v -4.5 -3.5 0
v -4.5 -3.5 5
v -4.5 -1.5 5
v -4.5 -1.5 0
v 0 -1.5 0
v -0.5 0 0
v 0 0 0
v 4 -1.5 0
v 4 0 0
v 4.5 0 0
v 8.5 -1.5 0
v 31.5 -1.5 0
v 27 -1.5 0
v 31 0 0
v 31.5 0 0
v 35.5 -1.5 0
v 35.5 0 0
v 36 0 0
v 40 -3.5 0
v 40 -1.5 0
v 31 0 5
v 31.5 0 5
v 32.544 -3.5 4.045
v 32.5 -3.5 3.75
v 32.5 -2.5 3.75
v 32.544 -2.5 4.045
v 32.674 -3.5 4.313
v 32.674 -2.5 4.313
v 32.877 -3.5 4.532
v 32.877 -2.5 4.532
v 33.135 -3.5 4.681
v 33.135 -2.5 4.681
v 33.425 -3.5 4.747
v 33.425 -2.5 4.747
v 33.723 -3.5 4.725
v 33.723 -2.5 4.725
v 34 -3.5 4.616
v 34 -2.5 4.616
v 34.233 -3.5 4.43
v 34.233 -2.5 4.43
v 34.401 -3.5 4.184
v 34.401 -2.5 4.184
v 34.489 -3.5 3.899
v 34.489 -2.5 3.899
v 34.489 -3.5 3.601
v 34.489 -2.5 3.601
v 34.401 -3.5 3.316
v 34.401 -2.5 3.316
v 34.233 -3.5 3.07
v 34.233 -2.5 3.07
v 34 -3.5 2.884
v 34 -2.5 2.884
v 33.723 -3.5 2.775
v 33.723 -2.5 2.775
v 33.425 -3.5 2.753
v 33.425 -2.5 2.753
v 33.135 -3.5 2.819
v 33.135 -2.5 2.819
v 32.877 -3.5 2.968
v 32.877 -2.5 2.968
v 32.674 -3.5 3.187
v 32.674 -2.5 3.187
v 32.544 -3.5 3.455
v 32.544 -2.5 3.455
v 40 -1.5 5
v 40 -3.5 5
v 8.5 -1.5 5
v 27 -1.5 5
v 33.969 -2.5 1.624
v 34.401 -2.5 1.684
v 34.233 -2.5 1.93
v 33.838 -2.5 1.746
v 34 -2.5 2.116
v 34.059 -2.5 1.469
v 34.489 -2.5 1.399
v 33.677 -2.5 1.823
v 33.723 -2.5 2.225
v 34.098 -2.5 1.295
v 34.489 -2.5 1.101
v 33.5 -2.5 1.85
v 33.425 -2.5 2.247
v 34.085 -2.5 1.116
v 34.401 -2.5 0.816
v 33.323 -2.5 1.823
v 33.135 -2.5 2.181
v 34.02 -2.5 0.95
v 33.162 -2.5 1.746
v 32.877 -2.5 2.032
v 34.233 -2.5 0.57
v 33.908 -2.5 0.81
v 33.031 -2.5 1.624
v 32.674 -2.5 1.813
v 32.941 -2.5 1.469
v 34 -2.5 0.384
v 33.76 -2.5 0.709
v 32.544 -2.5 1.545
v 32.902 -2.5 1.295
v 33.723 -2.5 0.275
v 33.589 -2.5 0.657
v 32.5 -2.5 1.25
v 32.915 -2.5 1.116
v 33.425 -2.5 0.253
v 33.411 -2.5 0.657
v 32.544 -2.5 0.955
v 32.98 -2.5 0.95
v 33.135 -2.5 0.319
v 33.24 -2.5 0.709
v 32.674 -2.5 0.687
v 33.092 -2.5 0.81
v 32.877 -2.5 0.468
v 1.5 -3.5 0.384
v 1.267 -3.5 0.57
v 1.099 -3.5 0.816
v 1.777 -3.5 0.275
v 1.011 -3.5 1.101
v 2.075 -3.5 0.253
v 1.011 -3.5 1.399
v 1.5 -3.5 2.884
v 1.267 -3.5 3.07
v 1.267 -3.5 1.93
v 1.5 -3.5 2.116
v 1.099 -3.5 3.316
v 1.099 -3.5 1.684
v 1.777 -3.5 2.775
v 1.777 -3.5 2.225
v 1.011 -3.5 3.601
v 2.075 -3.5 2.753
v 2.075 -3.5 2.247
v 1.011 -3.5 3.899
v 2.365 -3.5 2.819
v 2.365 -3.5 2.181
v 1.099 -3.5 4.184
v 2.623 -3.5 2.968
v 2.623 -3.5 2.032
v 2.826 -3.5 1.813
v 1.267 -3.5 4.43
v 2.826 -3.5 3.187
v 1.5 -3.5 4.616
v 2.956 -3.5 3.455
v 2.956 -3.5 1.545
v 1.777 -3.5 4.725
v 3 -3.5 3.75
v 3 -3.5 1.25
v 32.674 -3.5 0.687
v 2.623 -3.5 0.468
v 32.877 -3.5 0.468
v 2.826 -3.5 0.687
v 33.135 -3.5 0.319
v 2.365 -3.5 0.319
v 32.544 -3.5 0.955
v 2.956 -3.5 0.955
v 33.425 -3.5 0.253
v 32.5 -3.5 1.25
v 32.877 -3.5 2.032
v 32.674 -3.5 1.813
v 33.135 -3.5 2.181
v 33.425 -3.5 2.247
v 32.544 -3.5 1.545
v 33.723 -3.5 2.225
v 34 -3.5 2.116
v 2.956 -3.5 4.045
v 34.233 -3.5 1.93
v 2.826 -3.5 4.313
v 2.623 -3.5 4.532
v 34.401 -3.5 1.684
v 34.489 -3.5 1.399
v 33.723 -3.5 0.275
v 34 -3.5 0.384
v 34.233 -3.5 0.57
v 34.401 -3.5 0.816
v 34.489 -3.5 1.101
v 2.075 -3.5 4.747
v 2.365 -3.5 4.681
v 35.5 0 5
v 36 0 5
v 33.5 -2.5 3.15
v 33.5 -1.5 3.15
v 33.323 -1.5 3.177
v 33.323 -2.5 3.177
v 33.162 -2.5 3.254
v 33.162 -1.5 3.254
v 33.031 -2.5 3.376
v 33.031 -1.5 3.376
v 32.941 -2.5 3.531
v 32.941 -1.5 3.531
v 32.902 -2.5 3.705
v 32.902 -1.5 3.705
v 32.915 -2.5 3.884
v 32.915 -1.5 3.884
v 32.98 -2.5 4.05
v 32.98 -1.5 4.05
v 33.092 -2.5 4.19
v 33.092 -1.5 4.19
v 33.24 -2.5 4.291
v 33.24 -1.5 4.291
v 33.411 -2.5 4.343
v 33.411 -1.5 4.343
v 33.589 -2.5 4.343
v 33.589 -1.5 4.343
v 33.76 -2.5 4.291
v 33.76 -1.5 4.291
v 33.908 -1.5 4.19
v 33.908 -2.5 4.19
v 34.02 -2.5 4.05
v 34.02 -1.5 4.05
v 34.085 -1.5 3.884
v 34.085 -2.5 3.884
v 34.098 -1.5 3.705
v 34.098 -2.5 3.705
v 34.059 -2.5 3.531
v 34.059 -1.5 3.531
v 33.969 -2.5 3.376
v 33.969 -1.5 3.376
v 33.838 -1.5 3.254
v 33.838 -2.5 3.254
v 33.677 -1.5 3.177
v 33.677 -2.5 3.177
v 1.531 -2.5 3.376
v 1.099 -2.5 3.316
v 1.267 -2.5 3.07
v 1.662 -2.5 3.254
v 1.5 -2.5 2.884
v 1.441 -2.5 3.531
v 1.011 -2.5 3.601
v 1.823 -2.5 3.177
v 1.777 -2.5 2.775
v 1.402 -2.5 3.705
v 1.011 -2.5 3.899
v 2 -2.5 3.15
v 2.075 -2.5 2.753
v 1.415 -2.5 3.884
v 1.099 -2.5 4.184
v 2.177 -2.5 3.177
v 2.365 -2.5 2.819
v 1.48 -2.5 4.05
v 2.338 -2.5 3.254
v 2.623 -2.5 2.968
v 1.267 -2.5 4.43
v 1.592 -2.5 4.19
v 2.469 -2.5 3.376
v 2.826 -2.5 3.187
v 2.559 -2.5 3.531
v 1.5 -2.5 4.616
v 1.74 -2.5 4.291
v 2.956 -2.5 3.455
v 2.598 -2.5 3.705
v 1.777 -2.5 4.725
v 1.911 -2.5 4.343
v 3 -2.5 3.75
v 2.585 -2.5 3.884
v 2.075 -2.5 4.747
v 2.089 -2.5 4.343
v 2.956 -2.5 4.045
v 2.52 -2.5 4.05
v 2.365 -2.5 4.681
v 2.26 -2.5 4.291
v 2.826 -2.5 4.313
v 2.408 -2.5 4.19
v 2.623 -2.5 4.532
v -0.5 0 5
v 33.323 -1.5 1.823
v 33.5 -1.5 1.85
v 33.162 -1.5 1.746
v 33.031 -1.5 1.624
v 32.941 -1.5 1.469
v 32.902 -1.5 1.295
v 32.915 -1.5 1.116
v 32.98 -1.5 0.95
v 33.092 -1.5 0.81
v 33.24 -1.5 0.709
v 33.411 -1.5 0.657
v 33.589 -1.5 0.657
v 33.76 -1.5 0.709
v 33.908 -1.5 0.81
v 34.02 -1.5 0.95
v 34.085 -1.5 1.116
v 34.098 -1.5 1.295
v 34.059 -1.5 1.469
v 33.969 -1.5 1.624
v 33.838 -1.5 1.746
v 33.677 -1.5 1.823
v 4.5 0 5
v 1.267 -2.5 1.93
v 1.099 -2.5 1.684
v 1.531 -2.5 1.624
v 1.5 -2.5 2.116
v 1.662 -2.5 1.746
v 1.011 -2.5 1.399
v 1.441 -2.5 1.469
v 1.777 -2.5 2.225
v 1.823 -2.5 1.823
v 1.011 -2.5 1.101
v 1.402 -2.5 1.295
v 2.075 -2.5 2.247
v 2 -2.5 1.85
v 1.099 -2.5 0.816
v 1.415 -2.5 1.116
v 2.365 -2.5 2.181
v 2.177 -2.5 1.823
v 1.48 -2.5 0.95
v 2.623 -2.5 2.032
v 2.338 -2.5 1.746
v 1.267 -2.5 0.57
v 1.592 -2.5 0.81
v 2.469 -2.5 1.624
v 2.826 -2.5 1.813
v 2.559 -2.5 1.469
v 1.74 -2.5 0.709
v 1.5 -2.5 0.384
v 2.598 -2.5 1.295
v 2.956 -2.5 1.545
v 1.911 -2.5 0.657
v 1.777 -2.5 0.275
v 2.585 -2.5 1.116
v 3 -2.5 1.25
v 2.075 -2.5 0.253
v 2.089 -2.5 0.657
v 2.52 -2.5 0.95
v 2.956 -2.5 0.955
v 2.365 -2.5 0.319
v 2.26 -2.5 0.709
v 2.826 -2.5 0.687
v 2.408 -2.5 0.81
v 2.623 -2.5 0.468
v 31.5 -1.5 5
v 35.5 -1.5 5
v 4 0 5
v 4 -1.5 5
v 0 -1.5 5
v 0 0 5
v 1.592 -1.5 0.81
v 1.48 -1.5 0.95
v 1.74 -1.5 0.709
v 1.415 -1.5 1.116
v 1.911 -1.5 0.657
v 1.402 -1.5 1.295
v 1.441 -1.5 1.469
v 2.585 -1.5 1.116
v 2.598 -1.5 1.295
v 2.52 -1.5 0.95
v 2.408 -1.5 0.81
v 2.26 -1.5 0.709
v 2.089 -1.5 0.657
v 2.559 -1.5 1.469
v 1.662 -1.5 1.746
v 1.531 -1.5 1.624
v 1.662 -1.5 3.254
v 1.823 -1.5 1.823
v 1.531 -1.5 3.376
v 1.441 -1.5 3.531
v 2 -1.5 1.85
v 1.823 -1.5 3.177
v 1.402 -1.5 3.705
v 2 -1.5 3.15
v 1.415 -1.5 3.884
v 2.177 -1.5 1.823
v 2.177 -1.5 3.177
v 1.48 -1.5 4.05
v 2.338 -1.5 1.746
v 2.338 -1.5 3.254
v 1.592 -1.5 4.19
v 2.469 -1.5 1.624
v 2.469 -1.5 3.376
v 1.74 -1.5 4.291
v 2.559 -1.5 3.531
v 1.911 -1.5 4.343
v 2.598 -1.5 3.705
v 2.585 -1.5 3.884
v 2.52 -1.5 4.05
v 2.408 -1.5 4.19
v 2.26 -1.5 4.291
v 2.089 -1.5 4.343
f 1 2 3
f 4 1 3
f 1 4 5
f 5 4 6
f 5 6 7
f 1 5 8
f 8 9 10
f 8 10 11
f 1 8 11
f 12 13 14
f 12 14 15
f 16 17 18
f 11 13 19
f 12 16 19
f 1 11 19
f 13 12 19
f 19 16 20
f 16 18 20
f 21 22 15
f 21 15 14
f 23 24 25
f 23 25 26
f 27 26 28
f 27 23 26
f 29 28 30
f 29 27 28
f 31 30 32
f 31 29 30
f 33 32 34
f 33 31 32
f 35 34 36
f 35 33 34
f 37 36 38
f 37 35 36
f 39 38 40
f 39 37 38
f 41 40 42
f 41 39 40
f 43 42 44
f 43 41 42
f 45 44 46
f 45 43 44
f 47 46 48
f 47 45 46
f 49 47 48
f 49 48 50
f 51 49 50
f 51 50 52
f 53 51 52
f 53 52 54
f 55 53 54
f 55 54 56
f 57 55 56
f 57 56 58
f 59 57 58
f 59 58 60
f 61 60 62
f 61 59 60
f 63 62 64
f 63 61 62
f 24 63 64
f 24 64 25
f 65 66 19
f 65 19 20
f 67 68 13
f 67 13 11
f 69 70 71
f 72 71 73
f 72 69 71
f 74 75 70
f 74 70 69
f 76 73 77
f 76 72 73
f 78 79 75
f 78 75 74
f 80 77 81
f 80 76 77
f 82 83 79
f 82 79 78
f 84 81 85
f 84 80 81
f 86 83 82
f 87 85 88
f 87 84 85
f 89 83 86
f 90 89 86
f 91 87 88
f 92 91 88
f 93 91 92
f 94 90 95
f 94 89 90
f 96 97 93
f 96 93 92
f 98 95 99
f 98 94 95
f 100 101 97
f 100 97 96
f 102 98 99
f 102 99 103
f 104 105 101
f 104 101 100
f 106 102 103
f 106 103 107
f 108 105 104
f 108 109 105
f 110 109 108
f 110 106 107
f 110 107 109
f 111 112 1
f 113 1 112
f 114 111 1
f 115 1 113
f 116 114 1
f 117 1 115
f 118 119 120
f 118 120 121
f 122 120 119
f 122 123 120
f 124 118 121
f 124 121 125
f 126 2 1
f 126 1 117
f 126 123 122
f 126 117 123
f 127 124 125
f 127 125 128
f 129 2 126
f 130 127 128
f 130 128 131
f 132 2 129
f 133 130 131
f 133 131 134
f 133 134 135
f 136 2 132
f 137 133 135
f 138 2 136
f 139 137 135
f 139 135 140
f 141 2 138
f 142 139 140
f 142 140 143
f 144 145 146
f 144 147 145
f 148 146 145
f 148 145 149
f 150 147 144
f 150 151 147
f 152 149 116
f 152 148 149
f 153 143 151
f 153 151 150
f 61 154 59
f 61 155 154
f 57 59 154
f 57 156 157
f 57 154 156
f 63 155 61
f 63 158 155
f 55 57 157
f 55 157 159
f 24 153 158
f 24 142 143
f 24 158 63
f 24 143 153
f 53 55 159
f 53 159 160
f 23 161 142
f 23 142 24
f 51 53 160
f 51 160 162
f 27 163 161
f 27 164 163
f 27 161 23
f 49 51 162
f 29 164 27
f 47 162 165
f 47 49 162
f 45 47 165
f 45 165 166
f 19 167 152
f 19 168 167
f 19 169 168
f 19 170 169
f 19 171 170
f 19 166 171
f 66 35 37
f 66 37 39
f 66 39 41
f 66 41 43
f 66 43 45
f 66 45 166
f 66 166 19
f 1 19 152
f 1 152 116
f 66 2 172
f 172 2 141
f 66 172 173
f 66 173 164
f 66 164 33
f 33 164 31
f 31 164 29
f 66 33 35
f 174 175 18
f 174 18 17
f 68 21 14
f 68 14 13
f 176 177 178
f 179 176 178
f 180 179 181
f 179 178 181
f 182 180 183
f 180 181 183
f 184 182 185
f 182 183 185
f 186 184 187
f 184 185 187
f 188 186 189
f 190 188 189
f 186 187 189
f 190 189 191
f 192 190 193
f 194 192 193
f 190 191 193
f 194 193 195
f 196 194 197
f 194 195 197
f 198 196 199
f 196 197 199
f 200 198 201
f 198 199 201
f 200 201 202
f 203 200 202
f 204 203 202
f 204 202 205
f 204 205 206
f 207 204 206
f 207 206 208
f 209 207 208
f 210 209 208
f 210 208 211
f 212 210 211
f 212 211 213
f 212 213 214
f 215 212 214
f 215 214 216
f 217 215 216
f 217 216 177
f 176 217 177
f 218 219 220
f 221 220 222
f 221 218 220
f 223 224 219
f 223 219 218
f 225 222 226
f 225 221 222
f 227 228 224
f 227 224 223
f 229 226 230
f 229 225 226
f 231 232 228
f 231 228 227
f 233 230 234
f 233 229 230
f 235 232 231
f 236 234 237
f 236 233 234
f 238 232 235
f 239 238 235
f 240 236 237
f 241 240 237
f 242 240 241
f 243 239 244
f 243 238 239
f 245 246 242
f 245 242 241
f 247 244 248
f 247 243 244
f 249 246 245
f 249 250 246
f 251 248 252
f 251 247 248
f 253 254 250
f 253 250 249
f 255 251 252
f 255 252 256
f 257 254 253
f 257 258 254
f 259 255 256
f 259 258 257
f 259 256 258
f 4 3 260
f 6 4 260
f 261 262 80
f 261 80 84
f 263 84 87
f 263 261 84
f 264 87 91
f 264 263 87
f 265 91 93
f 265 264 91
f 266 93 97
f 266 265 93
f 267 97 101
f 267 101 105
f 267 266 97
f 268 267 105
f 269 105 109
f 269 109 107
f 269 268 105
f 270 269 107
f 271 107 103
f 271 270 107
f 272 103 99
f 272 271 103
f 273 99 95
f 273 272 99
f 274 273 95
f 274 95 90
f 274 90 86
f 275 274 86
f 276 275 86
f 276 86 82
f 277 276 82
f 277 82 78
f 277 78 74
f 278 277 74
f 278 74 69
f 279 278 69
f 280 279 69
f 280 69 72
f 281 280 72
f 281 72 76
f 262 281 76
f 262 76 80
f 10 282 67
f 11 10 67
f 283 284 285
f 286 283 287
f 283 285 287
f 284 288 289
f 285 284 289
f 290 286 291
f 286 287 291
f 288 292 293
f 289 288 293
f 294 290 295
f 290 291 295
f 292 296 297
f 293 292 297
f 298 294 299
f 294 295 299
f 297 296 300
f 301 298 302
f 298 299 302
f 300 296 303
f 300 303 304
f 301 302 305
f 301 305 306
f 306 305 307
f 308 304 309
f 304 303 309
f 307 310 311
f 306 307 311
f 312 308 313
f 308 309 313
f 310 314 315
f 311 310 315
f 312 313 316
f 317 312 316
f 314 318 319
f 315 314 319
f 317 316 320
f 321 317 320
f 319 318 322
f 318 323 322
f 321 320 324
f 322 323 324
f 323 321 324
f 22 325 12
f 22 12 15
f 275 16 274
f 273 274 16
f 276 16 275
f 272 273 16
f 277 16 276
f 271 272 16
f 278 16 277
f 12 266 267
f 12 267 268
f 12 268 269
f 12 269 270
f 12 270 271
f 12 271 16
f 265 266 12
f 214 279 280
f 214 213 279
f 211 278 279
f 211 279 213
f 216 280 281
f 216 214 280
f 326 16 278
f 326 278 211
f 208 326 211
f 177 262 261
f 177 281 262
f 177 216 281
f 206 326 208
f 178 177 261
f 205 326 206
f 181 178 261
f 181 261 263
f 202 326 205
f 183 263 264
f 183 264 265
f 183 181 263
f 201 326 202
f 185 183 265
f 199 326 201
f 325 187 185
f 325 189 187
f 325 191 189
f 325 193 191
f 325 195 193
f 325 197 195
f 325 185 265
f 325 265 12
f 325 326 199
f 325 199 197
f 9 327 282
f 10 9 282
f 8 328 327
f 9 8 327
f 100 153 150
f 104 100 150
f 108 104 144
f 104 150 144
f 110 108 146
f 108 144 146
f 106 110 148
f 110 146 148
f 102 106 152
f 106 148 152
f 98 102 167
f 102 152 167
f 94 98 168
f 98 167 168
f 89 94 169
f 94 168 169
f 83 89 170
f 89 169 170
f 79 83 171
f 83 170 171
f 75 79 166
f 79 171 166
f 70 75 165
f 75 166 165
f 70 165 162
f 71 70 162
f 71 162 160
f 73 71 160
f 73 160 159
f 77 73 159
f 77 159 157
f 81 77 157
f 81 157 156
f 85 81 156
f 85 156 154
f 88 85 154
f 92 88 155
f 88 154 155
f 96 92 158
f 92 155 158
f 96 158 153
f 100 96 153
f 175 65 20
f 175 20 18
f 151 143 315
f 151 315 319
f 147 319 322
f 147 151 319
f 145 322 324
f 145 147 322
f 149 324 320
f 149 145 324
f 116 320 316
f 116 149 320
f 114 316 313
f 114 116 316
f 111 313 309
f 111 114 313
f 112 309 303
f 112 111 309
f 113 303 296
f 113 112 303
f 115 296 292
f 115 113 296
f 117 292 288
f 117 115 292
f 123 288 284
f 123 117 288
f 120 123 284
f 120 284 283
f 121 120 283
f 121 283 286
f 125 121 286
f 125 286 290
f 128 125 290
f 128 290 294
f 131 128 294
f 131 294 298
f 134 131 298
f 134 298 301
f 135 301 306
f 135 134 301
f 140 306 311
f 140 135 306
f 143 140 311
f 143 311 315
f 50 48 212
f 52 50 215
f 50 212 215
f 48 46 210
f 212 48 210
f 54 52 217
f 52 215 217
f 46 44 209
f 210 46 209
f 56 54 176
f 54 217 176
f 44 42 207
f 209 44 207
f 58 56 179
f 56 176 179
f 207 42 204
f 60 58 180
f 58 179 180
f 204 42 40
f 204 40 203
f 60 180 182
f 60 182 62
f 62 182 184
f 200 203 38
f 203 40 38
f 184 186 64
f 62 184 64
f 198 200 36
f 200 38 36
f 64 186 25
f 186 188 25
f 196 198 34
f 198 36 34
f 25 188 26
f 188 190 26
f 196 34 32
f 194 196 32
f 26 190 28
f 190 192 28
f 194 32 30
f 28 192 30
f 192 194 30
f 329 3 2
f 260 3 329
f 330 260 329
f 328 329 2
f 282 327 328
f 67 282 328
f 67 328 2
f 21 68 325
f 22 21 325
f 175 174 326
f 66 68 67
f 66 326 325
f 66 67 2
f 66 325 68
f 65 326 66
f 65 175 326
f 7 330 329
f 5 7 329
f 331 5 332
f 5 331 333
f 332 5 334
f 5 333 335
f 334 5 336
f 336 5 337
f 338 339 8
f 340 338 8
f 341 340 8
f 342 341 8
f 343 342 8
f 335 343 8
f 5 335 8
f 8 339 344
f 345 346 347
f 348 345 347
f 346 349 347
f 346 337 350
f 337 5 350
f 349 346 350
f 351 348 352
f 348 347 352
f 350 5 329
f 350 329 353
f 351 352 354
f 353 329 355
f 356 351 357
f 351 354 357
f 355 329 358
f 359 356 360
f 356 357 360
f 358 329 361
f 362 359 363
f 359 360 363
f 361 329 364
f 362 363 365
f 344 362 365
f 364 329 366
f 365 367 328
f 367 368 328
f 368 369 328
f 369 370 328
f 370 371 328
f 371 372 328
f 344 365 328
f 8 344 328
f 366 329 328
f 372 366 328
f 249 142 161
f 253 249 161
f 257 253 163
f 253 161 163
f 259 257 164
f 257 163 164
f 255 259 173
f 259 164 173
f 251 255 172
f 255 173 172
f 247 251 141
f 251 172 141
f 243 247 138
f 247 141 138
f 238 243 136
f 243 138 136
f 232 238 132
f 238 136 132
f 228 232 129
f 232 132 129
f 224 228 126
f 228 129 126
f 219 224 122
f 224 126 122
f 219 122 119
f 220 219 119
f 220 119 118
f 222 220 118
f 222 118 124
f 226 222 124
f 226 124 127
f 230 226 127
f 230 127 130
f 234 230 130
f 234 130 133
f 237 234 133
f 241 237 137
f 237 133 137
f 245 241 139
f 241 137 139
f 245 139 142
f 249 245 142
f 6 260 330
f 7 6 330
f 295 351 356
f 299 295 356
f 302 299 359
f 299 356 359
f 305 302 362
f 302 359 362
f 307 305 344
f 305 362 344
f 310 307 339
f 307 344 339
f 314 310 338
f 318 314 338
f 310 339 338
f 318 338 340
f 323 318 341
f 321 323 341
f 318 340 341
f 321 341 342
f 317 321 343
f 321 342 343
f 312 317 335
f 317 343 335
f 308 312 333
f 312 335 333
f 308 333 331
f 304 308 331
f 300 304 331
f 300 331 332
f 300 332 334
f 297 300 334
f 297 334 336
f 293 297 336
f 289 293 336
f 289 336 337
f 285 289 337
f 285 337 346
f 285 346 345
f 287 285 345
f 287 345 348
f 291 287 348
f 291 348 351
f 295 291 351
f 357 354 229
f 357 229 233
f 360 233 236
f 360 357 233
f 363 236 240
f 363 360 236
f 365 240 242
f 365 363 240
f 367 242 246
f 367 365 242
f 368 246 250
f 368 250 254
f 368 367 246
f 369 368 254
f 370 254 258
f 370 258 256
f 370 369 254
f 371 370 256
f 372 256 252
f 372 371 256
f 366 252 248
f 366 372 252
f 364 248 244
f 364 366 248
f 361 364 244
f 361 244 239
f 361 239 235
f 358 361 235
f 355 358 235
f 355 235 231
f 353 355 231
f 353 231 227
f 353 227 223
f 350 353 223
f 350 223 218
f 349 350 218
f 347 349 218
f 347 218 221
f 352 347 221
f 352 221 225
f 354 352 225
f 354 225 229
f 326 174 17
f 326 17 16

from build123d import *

# Parameters (mm, degrees)
EXTRUDE_1_DEPTH     = 2.5
SKETCH_5_R          = 0.6
CUT_EXTRUDE_1_DEPTH = 19.036421485
CUT_EXTRUDE_START   = -2
SKETCH_5_3_R        = 1
CUT_EXTRUDE_2_DEPTH = 1


with BuildPart() as part:
    # 草图4 → 凸台-拉伸1 (new body)
    with BuildSketch(Plane.XY):
        Polygon((8.5, -1.5), (17.75, -1.5), (17.75, -3.5), (-4.5, -3.5), (-4.5, -1.5), (-0.5, 0), (0, 0), (0, -1.5), (4, -1.5), (4, 0), (4.5, 0), align=None)
    extrude(amount=EXTRUDE_1_DEPTH)

    # 草图5 → 切除-拉伸1 (cut, through all)
    with BuildSketch(Plane(origin=(0, -1.5, 0), x_dir=(1, 0, 0), z_dir=(0, 1, 0))):
        with Locations(Location((2, -1.25, 0), (0, 0, 270))):
            Circle(SKETCH_5_R)
    extrude(amount=-CUT_EXTRUDE_1_DEPTH, mode=Mode.SUBTRACT)

    # 草图5<3> → 切除-拉伸2 (cut)
    with BuildSketch(Plane(origin=(0, -1.5, 0), x_dir=(1, 0, 0), z_dir=(0, 1, 0)).offset(CUT_EXTRUDE_START)):
        with Locations((2, -1.25)):
            Circle(SKETCH_5_3_R)
    extrude(amount=CUT_EXTRUDE_2_DEPTH, mode=Mode.SUBTRACT)

    # 镜向1: part across plane


with BuildPart() as part_1:
    add(part.part)
    add(part.part.mirror(Plane.XY.offset(2.5)))

    # 镜向2: part across plane


with BuildPart() as part_2:
    add(part_1.part)
    add(part_1.part.mirror(Plane(origin=(17.75, 0, 2.5), x_dir=(0, 0, 1), z_dir=(1, 0, 0))))


solid = part_2.part
